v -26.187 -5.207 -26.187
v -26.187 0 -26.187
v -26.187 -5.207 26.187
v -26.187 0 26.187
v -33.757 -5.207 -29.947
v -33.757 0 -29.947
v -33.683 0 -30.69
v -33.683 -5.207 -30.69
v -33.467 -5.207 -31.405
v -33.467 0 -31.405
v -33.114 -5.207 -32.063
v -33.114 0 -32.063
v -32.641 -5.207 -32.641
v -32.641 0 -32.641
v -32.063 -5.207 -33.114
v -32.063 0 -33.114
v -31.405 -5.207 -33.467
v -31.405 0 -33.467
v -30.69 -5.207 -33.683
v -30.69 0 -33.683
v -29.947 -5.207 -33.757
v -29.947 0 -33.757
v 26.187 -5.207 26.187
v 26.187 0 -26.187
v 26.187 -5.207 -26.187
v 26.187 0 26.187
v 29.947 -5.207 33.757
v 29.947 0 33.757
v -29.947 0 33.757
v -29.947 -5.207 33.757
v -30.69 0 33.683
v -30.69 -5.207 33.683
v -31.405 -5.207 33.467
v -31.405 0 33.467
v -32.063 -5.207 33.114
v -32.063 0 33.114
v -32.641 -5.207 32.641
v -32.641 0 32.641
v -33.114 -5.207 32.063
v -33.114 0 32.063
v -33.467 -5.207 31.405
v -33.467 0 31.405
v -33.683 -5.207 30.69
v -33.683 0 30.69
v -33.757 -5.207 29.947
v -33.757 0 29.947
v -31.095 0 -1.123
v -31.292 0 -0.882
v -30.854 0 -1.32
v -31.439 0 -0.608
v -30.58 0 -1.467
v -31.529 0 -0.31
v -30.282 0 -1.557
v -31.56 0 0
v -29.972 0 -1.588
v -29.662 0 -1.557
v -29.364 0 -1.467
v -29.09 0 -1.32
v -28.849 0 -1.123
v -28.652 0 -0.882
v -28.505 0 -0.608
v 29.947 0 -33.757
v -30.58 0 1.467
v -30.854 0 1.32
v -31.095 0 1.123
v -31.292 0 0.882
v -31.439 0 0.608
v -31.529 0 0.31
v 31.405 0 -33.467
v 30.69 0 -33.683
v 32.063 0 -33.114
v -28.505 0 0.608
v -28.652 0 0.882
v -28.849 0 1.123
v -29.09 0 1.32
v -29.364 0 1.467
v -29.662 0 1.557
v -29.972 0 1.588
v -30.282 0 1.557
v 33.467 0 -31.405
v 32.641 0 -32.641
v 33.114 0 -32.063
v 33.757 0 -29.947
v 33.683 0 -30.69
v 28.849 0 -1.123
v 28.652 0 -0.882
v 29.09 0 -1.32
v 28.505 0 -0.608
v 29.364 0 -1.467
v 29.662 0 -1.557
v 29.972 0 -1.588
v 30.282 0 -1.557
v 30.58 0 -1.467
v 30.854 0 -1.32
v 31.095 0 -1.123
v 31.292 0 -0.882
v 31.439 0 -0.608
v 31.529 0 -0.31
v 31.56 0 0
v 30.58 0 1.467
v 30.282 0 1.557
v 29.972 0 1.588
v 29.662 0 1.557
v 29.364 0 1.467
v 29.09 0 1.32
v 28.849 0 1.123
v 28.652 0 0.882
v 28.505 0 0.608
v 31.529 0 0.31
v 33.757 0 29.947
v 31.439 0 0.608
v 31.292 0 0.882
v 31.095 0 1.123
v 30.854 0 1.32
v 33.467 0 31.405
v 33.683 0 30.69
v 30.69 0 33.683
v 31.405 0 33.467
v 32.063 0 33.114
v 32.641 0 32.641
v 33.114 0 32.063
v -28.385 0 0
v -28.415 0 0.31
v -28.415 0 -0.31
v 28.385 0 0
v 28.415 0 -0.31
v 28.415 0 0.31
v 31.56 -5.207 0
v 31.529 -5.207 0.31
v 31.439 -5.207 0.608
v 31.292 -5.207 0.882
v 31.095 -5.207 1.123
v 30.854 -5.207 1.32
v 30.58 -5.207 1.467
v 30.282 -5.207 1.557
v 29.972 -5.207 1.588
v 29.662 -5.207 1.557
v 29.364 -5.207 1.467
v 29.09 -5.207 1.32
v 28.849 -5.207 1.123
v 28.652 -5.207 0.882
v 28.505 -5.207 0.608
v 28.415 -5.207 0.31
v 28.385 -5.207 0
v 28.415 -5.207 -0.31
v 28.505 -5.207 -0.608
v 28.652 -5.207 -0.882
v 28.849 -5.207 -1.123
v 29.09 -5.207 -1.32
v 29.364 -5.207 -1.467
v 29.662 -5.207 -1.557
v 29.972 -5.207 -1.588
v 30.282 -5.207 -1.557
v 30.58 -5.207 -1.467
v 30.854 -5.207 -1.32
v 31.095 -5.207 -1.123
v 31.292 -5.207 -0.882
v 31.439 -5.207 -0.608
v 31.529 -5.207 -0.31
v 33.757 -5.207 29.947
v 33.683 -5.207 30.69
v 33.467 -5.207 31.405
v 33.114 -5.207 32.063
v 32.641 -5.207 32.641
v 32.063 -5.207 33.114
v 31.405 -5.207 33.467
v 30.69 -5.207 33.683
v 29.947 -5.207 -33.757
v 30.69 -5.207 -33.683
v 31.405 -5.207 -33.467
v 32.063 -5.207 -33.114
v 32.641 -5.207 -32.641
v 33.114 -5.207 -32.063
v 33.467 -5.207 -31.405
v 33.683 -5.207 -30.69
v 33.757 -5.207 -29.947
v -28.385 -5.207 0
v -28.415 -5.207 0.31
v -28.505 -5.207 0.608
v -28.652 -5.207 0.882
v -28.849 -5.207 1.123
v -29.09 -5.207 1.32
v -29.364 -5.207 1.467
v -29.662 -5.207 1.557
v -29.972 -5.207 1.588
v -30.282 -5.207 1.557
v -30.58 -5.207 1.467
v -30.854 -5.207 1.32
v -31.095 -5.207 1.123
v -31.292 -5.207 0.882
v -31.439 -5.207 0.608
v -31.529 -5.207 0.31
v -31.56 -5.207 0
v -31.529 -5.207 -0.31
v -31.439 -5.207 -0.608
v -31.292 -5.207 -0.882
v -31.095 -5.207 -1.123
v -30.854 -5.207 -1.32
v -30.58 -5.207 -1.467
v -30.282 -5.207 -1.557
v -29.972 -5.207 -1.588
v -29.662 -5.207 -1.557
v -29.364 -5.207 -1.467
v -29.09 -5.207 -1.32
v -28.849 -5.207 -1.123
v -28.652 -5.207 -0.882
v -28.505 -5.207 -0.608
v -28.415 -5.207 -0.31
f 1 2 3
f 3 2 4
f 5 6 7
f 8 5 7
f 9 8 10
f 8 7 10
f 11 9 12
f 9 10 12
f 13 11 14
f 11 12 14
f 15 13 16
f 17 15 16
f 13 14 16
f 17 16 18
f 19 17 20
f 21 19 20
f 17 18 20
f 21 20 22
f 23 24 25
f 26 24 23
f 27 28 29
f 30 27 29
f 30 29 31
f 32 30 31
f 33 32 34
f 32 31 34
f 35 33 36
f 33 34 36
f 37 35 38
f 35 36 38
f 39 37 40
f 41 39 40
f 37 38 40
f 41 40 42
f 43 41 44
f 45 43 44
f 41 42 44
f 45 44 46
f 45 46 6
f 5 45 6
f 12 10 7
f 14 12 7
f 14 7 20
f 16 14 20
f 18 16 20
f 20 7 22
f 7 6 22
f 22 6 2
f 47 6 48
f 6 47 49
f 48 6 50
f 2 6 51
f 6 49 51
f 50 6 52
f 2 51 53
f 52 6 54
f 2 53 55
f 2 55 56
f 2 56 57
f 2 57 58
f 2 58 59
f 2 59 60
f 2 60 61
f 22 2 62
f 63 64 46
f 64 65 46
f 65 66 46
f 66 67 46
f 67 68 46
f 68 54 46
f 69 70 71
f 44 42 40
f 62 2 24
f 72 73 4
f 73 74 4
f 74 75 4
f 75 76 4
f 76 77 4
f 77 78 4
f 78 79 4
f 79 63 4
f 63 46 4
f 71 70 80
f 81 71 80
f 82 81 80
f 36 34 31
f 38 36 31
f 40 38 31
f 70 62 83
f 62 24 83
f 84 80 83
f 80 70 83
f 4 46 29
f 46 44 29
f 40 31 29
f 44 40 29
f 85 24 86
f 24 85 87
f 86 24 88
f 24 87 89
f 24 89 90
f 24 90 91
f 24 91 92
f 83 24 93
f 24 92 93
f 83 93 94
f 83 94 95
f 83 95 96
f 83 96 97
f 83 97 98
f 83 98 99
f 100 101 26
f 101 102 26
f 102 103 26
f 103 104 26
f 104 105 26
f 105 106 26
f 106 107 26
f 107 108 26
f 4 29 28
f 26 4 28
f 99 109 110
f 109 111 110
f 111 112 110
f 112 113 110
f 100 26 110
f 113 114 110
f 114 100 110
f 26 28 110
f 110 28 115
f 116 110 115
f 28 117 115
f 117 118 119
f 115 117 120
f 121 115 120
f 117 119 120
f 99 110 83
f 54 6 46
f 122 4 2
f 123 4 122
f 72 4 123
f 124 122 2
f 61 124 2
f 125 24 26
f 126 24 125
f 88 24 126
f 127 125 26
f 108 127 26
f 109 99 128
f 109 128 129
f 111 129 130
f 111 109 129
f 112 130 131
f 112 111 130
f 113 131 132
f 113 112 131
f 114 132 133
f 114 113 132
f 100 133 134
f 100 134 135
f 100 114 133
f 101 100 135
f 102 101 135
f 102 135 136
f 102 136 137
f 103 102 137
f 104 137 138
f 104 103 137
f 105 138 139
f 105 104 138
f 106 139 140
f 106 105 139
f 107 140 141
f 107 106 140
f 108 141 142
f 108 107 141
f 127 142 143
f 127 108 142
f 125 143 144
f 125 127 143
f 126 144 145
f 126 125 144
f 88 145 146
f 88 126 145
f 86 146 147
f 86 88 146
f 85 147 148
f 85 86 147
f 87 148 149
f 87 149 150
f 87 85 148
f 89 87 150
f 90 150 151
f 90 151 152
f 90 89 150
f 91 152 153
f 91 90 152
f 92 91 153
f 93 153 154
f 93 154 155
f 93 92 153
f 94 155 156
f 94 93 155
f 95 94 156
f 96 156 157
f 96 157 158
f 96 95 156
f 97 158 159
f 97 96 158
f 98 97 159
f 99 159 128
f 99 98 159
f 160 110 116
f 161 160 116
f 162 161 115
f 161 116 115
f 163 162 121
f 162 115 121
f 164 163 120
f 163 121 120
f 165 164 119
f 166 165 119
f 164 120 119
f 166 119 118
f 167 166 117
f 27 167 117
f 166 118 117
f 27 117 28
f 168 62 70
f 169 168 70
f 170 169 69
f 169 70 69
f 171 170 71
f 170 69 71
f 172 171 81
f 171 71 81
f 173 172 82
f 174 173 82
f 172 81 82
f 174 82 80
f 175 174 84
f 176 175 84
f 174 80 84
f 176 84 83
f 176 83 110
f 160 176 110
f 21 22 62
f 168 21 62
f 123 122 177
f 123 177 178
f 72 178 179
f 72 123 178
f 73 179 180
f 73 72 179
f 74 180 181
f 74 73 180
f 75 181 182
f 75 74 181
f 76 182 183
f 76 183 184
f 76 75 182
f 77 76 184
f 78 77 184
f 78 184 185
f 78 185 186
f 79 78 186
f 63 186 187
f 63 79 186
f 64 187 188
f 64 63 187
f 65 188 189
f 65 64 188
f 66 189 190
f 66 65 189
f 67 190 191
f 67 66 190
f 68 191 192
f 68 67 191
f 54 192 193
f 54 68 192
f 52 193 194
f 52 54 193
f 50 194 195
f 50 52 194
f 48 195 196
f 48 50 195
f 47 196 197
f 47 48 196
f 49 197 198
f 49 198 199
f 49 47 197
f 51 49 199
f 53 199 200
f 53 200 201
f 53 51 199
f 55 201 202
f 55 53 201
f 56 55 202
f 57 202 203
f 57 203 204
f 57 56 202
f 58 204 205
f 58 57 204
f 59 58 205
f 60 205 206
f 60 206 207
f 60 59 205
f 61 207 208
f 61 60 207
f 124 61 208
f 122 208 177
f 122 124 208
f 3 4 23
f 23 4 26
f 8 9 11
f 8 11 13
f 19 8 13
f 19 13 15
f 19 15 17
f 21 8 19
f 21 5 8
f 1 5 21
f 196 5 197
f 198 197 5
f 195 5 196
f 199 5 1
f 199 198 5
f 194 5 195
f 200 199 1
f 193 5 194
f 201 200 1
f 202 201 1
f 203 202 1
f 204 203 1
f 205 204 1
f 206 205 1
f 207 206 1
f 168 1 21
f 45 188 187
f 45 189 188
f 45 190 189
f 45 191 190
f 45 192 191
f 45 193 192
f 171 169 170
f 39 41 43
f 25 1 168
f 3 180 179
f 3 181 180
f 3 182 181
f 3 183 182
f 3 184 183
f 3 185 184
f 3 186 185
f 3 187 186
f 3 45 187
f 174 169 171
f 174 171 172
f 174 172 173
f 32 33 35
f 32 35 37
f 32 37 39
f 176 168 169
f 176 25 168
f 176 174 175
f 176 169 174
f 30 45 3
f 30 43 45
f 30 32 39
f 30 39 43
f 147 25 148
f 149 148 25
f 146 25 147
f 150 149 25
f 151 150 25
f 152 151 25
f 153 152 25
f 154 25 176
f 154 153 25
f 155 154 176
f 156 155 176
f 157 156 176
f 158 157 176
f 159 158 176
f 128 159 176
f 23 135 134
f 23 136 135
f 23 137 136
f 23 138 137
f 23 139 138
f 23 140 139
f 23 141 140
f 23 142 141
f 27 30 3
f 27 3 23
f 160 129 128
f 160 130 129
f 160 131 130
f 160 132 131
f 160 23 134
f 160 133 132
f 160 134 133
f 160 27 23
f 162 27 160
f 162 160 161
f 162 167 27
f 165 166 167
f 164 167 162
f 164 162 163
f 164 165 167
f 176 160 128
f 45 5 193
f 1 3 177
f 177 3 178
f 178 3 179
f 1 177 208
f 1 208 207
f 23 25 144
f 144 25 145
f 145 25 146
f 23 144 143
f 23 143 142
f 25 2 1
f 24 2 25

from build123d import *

# Parameters (mm, degrees)
F0_R     = 1.5875
F0_W     = 52.3748
F0_H     = 52.3748
F1_DEPTH = 5.207


with BuildPart() as f1:
    # F0 (on Front) → F1 (new body)
    with BuildSketch(Plane.XZ):
        with BuildLine():
            Line((-29.9466, -33.7566), (29.9466, -33.7566))
            ThreePointArc((29.9466, -33.7566), (32.640677, -32.640677), (33.7566, -29.9466))
            Line((33.7566, -29.9466), (33.7566, 29.9466))
            ThreePointArc((33.7566, 29.9466), (32.640677, 32.640677), (29.9466, 33.7566))
            Line((29.9466, 33.7566), (-29.9466, 33.7566))
            ThreePointArc((-29.9466, 33.7566), (-32.640677, 32.640677), (-33.7566, 29.9466))
            Line((-33.7566, 29.9466), (-33.7566, -29.9466))
            ThreePointArc((-33.7566, -29.9466), (-32.640677, -32.640677), (-29.9466, -33.7566))
        make_face()
        with Locations((-29.972, 0)):
            Circle(F0_R, mode=Mode.SUBTRACT)
        Rectangle(F0_W, F0_H, mode=Mode.SUBTRACT)
        with Locations((29.972, 0)):
            Circle(F0_R, mode=Mode.SUBTRACT)
    extrude(amount=F1_DEPTH)


solid = f1.part
